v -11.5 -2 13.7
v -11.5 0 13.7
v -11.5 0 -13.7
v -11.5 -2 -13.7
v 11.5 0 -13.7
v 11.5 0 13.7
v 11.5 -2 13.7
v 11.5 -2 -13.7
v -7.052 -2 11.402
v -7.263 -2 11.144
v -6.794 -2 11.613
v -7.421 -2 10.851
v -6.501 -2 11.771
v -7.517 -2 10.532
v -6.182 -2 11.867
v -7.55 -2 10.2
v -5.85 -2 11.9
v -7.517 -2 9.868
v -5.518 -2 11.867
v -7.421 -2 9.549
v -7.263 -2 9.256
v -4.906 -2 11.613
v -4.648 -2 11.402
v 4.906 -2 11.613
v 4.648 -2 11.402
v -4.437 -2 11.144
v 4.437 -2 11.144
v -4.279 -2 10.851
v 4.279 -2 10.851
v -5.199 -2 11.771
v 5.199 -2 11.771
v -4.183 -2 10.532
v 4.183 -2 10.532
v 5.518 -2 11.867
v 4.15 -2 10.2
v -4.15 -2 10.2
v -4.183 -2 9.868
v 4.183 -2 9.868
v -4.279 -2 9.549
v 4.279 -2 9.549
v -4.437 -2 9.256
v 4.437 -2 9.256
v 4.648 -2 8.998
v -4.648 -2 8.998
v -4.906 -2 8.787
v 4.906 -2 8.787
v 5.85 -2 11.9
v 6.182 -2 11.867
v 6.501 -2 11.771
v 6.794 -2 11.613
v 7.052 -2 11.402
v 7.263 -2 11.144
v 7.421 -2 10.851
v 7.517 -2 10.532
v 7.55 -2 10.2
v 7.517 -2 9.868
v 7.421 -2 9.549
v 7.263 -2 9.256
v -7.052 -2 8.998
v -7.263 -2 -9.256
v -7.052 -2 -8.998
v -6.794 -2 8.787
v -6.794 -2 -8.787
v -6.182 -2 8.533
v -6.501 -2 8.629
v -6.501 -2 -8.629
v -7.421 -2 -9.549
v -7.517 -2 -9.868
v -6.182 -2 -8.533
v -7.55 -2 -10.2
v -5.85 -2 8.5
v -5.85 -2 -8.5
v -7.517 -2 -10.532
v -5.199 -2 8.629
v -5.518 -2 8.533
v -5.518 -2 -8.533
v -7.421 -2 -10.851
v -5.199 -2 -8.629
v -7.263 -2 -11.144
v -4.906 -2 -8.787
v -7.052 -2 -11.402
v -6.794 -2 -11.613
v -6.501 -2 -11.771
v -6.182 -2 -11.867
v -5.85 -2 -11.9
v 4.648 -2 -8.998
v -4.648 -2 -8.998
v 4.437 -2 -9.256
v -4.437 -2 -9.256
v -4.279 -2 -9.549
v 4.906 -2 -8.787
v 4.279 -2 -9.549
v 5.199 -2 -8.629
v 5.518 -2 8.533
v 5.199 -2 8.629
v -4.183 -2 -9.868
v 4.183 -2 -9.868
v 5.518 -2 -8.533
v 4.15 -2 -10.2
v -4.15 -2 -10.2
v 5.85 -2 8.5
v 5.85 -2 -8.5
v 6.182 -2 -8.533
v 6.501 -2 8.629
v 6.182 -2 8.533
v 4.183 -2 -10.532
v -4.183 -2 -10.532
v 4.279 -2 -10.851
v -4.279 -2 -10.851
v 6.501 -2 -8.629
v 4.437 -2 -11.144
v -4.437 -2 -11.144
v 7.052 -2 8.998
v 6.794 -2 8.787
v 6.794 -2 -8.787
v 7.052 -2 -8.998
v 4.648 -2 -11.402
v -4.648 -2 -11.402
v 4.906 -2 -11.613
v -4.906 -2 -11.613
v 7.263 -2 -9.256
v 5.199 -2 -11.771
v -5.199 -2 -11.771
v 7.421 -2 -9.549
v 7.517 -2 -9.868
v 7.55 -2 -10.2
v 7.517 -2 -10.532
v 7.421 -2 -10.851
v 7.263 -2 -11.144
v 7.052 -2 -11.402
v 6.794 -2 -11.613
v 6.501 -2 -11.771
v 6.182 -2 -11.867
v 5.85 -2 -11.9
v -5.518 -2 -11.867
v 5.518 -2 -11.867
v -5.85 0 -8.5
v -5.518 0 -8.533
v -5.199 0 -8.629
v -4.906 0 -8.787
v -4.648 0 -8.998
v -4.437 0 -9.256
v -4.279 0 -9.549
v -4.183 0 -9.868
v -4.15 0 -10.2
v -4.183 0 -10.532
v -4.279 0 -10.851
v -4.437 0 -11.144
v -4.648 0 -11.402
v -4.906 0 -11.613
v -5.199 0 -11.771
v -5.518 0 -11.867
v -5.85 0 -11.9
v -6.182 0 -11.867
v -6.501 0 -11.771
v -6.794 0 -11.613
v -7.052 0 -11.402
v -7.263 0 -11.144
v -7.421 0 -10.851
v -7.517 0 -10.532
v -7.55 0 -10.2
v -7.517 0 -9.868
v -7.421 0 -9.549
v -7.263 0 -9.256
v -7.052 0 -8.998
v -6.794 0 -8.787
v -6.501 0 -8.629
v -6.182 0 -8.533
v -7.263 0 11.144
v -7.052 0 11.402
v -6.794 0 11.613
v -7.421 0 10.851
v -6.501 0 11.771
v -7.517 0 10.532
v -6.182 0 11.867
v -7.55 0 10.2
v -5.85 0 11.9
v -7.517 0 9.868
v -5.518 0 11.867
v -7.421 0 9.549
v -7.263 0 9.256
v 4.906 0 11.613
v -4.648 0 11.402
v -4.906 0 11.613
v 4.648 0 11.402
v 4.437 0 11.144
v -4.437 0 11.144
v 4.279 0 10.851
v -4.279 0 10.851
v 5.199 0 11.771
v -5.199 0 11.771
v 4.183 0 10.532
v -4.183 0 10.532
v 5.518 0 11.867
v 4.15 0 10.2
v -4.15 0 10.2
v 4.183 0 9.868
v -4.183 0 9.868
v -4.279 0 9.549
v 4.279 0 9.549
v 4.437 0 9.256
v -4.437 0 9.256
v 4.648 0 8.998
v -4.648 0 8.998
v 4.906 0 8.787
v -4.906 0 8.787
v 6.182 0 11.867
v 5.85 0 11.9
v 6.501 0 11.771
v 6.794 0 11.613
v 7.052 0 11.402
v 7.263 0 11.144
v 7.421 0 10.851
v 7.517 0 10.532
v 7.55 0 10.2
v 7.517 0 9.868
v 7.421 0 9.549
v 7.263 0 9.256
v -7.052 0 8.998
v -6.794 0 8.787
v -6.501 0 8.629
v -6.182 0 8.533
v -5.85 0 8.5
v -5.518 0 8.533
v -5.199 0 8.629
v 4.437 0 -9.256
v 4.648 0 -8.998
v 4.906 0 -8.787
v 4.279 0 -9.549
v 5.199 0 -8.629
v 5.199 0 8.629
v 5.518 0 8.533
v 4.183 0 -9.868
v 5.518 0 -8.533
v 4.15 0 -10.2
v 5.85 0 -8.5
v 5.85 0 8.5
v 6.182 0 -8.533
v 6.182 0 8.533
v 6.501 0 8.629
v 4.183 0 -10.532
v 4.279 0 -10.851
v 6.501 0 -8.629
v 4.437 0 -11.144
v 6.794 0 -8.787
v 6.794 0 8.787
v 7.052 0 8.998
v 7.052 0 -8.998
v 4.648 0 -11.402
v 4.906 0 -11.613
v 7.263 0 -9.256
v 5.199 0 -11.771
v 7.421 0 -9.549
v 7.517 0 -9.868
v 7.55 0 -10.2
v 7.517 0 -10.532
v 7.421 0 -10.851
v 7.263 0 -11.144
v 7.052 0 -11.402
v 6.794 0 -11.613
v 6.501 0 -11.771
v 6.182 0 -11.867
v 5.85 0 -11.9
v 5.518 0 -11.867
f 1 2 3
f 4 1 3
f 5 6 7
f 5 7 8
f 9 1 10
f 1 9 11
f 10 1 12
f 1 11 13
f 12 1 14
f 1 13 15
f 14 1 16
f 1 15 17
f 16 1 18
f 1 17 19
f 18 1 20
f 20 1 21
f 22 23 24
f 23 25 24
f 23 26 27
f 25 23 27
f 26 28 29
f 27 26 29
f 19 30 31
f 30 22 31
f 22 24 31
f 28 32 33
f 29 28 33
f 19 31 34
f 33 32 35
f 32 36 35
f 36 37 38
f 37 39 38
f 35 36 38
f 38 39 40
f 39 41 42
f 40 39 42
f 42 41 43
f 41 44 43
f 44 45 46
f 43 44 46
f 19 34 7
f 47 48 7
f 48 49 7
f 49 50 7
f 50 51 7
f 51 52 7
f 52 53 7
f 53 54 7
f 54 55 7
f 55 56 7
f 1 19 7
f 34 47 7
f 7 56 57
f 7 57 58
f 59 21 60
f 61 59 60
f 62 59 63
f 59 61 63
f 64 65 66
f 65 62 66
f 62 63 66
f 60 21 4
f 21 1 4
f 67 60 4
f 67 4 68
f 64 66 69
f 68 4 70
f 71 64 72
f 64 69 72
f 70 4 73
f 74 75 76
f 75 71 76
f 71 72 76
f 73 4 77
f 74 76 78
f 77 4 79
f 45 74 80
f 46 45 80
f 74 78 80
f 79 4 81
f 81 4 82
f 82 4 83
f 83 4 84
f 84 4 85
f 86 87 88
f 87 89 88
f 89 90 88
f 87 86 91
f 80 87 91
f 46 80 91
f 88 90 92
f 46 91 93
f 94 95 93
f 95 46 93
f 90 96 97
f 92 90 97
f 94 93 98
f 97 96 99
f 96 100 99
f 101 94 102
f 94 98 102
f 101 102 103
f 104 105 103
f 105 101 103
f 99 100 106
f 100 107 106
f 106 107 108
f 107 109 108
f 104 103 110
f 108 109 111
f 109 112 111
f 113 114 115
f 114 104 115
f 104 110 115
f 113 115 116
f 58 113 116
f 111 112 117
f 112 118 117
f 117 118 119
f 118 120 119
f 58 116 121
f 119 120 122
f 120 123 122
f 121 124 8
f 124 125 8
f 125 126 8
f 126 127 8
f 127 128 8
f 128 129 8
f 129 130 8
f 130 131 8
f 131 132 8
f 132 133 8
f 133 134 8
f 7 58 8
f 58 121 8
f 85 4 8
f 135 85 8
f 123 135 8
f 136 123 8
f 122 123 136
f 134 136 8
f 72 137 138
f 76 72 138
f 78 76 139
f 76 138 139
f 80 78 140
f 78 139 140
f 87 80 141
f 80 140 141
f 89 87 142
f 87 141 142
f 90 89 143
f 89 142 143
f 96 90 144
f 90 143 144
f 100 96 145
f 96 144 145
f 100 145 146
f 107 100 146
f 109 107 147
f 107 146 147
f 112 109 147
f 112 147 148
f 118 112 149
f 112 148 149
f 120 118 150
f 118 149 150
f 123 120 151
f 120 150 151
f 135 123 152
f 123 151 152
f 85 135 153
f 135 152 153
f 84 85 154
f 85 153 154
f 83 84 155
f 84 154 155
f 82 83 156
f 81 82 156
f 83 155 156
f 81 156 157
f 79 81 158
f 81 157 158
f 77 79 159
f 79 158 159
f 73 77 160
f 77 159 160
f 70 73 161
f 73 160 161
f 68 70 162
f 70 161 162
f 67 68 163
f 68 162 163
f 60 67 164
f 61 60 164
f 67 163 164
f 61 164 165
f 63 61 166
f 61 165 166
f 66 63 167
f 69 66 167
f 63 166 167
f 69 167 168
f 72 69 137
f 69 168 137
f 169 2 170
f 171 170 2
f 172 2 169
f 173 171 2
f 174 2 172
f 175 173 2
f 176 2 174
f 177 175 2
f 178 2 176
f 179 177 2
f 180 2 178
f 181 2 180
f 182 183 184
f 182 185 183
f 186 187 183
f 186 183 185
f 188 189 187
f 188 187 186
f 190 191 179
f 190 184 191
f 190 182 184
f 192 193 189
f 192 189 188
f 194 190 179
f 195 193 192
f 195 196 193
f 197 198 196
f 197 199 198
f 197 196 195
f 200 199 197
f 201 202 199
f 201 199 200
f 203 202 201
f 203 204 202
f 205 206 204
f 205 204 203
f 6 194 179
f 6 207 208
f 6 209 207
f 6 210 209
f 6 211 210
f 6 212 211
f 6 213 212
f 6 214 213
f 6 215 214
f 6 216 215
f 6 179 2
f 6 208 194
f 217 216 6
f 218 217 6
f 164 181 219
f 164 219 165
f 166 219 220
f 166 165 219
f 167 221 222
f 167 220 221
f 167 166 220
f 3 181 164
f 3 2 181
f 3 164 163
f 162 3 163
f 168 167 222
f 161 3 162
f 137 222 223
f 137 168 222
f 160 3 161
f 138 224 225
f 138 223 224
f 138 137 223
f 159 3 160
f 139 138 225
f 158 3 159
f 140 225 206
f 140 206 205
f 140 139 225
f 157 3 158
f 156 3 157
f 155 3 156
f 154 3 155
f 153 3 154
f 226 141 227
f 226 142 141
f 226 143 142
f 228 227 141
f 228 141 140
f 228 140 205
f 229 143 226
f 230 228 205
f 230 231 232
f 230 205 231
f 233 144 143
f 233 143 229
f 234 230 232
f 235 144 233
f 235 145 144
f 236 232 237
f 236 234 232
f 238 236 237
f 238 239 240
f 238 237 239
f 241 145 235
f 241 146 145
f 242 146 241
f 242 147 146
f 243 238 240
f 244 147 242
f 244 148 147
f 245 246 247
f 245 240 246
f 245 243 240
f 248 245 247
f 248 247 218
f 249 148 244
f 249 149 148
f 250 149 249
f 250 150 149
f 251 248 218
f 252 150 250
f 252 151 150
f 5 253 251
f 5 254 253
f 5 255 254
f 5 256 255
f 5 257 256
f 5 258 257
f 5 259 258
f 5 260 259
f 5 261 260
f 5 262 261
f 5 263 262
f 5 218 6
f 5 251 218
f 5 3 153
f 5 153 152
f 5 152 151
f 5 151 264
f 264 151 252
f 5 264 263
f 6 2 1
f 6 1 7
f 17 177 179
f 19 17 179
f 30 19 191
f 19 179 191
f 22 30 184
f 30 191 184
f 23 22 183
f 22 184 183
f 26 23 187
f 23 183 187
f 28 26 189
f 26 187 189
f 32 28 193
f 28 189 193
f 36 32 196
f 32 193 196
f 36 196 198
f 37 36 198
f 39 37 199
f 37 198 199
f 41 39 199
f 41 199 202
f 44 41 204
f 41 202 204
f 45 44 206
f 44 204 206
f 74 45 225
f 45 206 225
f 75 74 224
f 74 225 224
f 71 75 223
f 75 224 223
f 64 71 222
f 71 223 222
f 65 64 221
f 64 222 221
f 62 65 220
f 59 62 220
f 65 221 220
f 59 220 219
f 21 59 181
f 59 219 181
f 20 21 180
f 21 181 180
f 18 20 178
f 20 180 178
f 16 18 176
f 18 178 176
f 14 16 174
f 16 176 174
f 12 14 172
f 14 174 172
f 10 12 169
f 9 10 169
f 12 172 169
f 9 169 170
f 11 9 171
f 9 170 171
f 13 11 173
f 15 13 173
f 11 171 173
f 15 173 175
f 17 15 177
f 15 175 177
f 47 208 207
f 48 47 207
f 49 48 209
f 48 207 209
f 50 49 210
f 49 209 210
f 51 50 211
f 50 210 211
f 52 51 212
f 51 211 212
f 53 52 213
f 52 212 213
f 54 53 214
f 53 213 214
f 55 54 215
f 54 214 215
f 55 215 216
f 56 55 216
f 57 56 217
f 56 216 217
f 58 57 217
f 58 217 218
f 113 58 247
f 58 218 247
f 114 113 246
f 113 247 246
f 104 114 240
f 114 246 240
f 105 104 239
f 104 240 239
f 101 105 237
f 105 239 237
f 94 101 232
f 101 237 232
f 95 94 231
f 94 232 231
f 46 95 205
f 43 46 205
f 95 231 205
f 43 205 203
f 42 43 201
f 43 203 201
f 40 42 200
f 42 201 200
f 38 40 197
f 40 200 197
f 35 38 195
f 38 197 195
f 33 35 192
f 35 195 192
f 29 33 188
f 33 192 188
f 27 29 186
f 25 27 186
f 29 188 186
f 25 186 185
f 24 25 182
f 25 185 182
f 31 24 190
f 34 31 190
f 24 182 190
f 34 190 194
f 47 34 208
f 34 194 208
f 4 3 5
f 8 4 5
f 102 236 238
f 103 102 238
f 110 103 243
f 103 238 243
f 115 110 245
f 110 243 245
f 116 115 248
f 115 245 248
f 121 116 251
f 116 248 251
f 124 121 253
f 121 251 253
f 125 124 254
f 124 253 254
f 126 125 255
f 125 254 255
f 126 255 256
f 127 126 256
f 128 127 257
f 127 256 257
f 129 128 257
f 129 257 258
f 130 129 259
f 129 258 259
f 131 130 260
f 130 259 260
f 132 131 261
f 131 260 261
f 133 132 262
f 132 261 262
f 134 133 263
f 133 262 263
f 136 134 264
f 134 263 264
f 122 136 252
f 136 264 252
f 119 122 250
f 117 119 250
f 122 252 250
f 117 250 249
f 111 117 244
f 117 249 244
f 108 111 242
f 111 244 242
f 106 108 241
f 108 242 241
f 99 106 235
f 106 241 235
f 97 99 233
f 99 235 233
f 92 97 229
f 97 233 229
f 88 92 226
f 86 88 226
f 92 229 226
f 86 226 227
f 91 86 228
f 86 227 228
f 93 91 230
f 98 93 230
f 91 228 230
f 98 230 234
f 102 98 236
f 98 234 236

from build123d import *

# Parameters (mm, degrees)
SKETCH1_W           = 23
SKETCH1_H           = 27.4
SKETCH1_R           = 1.7
BOSS_EXTRUDE1_DEPTH = 2


with BuildPart() as part:
    # Sketch1 → Boss-Extrude1 (new body)
    with BuildSketch(Plane(origin=(0, 0, 0), x_dir=(1, 0, 0), z_dir=(0, 1, 0))):
        Rectangle(SKETCH1_W, SKETCH1_H)
        with Locations(Location((5.85, 10.2, 0), (0, 0, 270))):
            Circle(SKETCH1_R, mode=Mode.SUBTRACT)
        with Locations(Location((-5.85, 10.2, 0), (0, 0, 270))):
            Circle(SKETCH1_R, mode=Mode.SUBTRACT)
        with Locations(Location((5.85, -10.2, 0), (0, 0, 270))):
            Circle(SKETCH1_R, mode=Mode.SUBTRACT)
        with Locations(Location((-5.85, -10.2, 0), (0, 0, 270))):
            Circle(SKETCH1_R, mode=Mode.SUBTRACT)
    extrude(amount=-BOSS_EXTRUDE1_DEPTH)


solid = part.part
